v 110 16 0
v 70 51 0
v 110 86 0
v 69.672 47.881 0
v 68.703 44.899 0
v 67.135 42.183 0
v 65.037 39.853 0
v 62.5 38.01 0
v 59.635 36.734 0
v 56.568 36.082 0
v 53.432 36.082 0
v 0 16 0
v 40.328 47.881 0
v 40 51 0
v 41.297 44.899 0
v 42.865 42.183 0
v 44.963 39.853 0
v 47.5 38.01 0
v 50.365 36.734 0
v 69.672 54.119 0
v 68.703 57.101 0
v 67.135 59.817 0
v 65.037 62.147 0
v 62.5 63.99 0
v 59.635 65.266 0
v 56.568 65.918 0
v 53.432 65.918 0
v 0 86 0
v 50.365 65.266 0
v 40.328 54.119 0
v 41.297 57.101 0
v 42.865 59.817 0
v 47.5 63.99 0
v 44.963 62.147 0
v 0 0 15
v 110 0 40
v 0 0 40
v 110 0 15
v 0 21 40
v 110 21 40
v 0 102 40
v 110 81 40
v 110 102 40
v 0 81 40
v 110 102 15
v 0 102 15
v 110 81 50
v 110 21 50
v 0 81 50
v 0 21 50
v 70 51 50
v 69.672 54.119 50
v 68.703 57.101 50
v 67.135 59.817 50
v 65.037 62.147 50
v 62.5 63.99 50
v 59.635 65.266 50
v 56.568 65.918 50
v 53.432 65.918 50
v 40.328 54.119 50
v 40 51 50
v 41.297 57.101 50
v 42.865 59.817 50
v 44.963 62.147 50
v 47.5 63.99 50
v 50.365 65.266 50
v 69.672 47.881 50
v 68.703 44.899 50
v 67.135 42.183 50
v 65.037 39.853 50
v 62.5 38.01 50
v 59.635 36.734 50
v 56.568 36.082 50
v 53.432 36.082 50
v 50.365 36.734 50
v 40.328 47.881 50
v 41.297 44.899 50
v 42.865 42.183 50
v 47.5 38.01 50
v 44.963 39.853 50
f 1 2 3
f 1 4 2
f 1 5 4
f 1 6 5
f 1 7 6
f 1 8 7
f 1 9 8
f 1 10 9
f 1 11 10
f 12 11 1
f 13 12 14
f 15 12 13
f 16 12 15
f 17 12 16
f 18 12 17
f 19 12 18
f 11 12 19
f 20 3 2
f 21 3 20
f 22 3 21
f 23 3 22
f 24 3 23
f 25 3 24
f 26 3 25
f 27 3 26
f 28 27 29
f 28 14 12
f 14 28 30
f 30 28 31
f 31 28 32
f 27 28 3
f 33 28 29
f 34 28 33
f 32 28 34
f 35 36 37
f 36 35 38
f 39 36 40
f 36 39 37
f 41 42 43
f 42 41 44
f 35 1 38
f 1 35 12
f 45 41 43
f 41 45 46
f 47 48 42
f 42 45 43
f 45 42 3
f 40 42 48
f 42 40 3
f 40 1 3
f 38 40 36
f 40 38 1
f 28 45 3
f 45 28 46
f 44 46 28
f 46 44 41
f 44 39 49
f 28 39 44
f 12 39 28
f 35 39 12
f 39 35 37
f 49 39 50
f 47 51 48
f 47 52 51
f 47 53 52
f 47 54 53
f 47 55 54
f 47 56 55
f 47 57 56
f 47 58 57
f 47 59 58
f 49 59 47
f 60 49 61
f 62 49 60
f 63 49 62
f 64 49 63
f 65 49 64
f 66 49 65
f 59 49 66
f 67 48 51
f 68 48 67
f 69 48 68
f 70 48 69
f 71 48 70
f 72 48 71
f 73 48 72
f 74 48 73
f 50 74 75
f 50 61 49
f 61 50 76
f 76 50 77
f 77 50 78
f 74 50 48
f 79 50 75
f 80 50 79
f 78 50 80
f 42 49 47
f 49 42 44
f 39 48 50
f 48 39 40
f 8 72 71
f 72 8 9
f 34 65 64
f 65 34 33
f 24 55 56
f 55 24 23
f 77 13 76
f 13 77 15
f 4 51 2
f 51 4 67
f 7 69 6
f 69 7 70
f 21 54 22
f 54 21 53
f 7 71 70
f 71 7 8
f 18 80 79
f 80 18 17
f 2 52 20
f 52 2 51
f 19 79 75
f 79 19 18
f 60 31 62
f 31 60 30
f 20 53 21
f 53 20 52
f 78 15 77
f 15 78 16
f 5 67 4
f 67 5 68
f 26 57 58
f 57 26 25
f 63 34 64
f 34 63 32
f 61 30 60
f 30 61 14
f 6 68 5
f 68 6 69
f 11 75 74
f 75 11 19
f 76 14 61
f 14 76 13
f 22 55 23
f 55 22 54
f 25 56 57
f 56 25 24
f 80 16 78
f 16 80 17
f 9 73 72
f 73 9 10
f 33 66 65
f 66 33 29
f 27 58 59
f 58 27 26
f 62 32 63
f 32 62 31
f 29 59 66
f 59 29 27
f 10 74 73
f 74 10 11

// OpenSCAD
module tslide(length,
              width,
              height,
              top_length,
              top_width,
              top_height,
              bottom_width,
              slope_height,
              screw_diameter,
              center=false) {
    module base() {
        union() {
            polyhedron(
                points=[
                    // 0
                    [0, width - (width - bottom_width) / 2, 0],
                    // 1
                    [length, width - (width - bottom_width) / 2, 0],
                    // 2
                    [length, (width - bottom_width) / 2, 0],
                    // 3
                    [0, (width - bottom_width) / 2, 0],
                    
                    // 4
                    [0, width, slope_height],
                    // 5
                    [length, width, slope_height],
                    // 6
                    [length, 0, slope_height],
                    // 7
                    [0, 0, slope_height],
                    
                    // 8
                    [0, width, height - top_height],
                    // 9
                    [length, width, height - top_height],
                    // 10
                    [length, 0, height - top_height],
                    // 11
                    [0, 0, height - top_height],

                    
                ],
                faces=[
                    [3, 2, 1, 0],
                    [8, 9, 10, 11],
                    
                    [0, 4, 8, 11, 7, 3],
                    [2, 6, 10, 9, 5, 1],
                    
                    [1, 5, 4, 0],
                    [3, 7, 6, 2],
                    
                    [5, 9, 8, 4],
                    [7, 11, 10, 6],
                ]
            );
            polyhedron(
                points=[
                    // 0
                    [(length - top_length) / 2, width - (width - top_width) / 2, height - top_height],
                    // 1
                    [length - (length - top_length) / 2, width - (width - top_width) / 2, height - top_height],
                    // 2
                    [length - (length - top_length) / 2, (width - top_width) / 2, height - top_height],
                    // 3
                    [(length - top_length) / 2, (width - top_width) / 2, height - top_height],

                    // 4
                    [(length - top_length) / 2, width - (width - top_width) / 2, height],
                    // 5
                    [length - (length - top_length) / 2, width - (width - top_width) / 2, height],
                    // 6
                    [length - (length - top_length) / 2, (width - top_width) / 2, height],
                    // 7
                    [(length - top_length) / 2, (width - top_width) / 2, height],
                ],
                faces=[
                    [3, 2, 1, 0],
                    [4, 5, 6, 7],
                    [7, 6, 2, 3],
                    [5, 4, 0, 1],
                    [4, 7, 3, 0],
                    [6, 5, 1, 2],
                ]
            );
        }
    }
    difference() {
        if (center) {
            translate([-length / 2, -width / 2, -height / 2]) { 
                base();
            }
        } else {
            base();
        }
        if (center) {
            cylinder(h=height, d=screw_diameter, center=true);
        } else {
            translate([length / 2, width / 2, 0]) {
                cylinder(h=height, d=screw_diameter);
            }
        }
    }
}

tslide(length=110,
       width=102,
       height=50,
       top_length=110,
       top_width=60,
       top_height=10,
       bottom_width=70,
       slope_height=15,
       screw_diameter=30,
       center=false);
